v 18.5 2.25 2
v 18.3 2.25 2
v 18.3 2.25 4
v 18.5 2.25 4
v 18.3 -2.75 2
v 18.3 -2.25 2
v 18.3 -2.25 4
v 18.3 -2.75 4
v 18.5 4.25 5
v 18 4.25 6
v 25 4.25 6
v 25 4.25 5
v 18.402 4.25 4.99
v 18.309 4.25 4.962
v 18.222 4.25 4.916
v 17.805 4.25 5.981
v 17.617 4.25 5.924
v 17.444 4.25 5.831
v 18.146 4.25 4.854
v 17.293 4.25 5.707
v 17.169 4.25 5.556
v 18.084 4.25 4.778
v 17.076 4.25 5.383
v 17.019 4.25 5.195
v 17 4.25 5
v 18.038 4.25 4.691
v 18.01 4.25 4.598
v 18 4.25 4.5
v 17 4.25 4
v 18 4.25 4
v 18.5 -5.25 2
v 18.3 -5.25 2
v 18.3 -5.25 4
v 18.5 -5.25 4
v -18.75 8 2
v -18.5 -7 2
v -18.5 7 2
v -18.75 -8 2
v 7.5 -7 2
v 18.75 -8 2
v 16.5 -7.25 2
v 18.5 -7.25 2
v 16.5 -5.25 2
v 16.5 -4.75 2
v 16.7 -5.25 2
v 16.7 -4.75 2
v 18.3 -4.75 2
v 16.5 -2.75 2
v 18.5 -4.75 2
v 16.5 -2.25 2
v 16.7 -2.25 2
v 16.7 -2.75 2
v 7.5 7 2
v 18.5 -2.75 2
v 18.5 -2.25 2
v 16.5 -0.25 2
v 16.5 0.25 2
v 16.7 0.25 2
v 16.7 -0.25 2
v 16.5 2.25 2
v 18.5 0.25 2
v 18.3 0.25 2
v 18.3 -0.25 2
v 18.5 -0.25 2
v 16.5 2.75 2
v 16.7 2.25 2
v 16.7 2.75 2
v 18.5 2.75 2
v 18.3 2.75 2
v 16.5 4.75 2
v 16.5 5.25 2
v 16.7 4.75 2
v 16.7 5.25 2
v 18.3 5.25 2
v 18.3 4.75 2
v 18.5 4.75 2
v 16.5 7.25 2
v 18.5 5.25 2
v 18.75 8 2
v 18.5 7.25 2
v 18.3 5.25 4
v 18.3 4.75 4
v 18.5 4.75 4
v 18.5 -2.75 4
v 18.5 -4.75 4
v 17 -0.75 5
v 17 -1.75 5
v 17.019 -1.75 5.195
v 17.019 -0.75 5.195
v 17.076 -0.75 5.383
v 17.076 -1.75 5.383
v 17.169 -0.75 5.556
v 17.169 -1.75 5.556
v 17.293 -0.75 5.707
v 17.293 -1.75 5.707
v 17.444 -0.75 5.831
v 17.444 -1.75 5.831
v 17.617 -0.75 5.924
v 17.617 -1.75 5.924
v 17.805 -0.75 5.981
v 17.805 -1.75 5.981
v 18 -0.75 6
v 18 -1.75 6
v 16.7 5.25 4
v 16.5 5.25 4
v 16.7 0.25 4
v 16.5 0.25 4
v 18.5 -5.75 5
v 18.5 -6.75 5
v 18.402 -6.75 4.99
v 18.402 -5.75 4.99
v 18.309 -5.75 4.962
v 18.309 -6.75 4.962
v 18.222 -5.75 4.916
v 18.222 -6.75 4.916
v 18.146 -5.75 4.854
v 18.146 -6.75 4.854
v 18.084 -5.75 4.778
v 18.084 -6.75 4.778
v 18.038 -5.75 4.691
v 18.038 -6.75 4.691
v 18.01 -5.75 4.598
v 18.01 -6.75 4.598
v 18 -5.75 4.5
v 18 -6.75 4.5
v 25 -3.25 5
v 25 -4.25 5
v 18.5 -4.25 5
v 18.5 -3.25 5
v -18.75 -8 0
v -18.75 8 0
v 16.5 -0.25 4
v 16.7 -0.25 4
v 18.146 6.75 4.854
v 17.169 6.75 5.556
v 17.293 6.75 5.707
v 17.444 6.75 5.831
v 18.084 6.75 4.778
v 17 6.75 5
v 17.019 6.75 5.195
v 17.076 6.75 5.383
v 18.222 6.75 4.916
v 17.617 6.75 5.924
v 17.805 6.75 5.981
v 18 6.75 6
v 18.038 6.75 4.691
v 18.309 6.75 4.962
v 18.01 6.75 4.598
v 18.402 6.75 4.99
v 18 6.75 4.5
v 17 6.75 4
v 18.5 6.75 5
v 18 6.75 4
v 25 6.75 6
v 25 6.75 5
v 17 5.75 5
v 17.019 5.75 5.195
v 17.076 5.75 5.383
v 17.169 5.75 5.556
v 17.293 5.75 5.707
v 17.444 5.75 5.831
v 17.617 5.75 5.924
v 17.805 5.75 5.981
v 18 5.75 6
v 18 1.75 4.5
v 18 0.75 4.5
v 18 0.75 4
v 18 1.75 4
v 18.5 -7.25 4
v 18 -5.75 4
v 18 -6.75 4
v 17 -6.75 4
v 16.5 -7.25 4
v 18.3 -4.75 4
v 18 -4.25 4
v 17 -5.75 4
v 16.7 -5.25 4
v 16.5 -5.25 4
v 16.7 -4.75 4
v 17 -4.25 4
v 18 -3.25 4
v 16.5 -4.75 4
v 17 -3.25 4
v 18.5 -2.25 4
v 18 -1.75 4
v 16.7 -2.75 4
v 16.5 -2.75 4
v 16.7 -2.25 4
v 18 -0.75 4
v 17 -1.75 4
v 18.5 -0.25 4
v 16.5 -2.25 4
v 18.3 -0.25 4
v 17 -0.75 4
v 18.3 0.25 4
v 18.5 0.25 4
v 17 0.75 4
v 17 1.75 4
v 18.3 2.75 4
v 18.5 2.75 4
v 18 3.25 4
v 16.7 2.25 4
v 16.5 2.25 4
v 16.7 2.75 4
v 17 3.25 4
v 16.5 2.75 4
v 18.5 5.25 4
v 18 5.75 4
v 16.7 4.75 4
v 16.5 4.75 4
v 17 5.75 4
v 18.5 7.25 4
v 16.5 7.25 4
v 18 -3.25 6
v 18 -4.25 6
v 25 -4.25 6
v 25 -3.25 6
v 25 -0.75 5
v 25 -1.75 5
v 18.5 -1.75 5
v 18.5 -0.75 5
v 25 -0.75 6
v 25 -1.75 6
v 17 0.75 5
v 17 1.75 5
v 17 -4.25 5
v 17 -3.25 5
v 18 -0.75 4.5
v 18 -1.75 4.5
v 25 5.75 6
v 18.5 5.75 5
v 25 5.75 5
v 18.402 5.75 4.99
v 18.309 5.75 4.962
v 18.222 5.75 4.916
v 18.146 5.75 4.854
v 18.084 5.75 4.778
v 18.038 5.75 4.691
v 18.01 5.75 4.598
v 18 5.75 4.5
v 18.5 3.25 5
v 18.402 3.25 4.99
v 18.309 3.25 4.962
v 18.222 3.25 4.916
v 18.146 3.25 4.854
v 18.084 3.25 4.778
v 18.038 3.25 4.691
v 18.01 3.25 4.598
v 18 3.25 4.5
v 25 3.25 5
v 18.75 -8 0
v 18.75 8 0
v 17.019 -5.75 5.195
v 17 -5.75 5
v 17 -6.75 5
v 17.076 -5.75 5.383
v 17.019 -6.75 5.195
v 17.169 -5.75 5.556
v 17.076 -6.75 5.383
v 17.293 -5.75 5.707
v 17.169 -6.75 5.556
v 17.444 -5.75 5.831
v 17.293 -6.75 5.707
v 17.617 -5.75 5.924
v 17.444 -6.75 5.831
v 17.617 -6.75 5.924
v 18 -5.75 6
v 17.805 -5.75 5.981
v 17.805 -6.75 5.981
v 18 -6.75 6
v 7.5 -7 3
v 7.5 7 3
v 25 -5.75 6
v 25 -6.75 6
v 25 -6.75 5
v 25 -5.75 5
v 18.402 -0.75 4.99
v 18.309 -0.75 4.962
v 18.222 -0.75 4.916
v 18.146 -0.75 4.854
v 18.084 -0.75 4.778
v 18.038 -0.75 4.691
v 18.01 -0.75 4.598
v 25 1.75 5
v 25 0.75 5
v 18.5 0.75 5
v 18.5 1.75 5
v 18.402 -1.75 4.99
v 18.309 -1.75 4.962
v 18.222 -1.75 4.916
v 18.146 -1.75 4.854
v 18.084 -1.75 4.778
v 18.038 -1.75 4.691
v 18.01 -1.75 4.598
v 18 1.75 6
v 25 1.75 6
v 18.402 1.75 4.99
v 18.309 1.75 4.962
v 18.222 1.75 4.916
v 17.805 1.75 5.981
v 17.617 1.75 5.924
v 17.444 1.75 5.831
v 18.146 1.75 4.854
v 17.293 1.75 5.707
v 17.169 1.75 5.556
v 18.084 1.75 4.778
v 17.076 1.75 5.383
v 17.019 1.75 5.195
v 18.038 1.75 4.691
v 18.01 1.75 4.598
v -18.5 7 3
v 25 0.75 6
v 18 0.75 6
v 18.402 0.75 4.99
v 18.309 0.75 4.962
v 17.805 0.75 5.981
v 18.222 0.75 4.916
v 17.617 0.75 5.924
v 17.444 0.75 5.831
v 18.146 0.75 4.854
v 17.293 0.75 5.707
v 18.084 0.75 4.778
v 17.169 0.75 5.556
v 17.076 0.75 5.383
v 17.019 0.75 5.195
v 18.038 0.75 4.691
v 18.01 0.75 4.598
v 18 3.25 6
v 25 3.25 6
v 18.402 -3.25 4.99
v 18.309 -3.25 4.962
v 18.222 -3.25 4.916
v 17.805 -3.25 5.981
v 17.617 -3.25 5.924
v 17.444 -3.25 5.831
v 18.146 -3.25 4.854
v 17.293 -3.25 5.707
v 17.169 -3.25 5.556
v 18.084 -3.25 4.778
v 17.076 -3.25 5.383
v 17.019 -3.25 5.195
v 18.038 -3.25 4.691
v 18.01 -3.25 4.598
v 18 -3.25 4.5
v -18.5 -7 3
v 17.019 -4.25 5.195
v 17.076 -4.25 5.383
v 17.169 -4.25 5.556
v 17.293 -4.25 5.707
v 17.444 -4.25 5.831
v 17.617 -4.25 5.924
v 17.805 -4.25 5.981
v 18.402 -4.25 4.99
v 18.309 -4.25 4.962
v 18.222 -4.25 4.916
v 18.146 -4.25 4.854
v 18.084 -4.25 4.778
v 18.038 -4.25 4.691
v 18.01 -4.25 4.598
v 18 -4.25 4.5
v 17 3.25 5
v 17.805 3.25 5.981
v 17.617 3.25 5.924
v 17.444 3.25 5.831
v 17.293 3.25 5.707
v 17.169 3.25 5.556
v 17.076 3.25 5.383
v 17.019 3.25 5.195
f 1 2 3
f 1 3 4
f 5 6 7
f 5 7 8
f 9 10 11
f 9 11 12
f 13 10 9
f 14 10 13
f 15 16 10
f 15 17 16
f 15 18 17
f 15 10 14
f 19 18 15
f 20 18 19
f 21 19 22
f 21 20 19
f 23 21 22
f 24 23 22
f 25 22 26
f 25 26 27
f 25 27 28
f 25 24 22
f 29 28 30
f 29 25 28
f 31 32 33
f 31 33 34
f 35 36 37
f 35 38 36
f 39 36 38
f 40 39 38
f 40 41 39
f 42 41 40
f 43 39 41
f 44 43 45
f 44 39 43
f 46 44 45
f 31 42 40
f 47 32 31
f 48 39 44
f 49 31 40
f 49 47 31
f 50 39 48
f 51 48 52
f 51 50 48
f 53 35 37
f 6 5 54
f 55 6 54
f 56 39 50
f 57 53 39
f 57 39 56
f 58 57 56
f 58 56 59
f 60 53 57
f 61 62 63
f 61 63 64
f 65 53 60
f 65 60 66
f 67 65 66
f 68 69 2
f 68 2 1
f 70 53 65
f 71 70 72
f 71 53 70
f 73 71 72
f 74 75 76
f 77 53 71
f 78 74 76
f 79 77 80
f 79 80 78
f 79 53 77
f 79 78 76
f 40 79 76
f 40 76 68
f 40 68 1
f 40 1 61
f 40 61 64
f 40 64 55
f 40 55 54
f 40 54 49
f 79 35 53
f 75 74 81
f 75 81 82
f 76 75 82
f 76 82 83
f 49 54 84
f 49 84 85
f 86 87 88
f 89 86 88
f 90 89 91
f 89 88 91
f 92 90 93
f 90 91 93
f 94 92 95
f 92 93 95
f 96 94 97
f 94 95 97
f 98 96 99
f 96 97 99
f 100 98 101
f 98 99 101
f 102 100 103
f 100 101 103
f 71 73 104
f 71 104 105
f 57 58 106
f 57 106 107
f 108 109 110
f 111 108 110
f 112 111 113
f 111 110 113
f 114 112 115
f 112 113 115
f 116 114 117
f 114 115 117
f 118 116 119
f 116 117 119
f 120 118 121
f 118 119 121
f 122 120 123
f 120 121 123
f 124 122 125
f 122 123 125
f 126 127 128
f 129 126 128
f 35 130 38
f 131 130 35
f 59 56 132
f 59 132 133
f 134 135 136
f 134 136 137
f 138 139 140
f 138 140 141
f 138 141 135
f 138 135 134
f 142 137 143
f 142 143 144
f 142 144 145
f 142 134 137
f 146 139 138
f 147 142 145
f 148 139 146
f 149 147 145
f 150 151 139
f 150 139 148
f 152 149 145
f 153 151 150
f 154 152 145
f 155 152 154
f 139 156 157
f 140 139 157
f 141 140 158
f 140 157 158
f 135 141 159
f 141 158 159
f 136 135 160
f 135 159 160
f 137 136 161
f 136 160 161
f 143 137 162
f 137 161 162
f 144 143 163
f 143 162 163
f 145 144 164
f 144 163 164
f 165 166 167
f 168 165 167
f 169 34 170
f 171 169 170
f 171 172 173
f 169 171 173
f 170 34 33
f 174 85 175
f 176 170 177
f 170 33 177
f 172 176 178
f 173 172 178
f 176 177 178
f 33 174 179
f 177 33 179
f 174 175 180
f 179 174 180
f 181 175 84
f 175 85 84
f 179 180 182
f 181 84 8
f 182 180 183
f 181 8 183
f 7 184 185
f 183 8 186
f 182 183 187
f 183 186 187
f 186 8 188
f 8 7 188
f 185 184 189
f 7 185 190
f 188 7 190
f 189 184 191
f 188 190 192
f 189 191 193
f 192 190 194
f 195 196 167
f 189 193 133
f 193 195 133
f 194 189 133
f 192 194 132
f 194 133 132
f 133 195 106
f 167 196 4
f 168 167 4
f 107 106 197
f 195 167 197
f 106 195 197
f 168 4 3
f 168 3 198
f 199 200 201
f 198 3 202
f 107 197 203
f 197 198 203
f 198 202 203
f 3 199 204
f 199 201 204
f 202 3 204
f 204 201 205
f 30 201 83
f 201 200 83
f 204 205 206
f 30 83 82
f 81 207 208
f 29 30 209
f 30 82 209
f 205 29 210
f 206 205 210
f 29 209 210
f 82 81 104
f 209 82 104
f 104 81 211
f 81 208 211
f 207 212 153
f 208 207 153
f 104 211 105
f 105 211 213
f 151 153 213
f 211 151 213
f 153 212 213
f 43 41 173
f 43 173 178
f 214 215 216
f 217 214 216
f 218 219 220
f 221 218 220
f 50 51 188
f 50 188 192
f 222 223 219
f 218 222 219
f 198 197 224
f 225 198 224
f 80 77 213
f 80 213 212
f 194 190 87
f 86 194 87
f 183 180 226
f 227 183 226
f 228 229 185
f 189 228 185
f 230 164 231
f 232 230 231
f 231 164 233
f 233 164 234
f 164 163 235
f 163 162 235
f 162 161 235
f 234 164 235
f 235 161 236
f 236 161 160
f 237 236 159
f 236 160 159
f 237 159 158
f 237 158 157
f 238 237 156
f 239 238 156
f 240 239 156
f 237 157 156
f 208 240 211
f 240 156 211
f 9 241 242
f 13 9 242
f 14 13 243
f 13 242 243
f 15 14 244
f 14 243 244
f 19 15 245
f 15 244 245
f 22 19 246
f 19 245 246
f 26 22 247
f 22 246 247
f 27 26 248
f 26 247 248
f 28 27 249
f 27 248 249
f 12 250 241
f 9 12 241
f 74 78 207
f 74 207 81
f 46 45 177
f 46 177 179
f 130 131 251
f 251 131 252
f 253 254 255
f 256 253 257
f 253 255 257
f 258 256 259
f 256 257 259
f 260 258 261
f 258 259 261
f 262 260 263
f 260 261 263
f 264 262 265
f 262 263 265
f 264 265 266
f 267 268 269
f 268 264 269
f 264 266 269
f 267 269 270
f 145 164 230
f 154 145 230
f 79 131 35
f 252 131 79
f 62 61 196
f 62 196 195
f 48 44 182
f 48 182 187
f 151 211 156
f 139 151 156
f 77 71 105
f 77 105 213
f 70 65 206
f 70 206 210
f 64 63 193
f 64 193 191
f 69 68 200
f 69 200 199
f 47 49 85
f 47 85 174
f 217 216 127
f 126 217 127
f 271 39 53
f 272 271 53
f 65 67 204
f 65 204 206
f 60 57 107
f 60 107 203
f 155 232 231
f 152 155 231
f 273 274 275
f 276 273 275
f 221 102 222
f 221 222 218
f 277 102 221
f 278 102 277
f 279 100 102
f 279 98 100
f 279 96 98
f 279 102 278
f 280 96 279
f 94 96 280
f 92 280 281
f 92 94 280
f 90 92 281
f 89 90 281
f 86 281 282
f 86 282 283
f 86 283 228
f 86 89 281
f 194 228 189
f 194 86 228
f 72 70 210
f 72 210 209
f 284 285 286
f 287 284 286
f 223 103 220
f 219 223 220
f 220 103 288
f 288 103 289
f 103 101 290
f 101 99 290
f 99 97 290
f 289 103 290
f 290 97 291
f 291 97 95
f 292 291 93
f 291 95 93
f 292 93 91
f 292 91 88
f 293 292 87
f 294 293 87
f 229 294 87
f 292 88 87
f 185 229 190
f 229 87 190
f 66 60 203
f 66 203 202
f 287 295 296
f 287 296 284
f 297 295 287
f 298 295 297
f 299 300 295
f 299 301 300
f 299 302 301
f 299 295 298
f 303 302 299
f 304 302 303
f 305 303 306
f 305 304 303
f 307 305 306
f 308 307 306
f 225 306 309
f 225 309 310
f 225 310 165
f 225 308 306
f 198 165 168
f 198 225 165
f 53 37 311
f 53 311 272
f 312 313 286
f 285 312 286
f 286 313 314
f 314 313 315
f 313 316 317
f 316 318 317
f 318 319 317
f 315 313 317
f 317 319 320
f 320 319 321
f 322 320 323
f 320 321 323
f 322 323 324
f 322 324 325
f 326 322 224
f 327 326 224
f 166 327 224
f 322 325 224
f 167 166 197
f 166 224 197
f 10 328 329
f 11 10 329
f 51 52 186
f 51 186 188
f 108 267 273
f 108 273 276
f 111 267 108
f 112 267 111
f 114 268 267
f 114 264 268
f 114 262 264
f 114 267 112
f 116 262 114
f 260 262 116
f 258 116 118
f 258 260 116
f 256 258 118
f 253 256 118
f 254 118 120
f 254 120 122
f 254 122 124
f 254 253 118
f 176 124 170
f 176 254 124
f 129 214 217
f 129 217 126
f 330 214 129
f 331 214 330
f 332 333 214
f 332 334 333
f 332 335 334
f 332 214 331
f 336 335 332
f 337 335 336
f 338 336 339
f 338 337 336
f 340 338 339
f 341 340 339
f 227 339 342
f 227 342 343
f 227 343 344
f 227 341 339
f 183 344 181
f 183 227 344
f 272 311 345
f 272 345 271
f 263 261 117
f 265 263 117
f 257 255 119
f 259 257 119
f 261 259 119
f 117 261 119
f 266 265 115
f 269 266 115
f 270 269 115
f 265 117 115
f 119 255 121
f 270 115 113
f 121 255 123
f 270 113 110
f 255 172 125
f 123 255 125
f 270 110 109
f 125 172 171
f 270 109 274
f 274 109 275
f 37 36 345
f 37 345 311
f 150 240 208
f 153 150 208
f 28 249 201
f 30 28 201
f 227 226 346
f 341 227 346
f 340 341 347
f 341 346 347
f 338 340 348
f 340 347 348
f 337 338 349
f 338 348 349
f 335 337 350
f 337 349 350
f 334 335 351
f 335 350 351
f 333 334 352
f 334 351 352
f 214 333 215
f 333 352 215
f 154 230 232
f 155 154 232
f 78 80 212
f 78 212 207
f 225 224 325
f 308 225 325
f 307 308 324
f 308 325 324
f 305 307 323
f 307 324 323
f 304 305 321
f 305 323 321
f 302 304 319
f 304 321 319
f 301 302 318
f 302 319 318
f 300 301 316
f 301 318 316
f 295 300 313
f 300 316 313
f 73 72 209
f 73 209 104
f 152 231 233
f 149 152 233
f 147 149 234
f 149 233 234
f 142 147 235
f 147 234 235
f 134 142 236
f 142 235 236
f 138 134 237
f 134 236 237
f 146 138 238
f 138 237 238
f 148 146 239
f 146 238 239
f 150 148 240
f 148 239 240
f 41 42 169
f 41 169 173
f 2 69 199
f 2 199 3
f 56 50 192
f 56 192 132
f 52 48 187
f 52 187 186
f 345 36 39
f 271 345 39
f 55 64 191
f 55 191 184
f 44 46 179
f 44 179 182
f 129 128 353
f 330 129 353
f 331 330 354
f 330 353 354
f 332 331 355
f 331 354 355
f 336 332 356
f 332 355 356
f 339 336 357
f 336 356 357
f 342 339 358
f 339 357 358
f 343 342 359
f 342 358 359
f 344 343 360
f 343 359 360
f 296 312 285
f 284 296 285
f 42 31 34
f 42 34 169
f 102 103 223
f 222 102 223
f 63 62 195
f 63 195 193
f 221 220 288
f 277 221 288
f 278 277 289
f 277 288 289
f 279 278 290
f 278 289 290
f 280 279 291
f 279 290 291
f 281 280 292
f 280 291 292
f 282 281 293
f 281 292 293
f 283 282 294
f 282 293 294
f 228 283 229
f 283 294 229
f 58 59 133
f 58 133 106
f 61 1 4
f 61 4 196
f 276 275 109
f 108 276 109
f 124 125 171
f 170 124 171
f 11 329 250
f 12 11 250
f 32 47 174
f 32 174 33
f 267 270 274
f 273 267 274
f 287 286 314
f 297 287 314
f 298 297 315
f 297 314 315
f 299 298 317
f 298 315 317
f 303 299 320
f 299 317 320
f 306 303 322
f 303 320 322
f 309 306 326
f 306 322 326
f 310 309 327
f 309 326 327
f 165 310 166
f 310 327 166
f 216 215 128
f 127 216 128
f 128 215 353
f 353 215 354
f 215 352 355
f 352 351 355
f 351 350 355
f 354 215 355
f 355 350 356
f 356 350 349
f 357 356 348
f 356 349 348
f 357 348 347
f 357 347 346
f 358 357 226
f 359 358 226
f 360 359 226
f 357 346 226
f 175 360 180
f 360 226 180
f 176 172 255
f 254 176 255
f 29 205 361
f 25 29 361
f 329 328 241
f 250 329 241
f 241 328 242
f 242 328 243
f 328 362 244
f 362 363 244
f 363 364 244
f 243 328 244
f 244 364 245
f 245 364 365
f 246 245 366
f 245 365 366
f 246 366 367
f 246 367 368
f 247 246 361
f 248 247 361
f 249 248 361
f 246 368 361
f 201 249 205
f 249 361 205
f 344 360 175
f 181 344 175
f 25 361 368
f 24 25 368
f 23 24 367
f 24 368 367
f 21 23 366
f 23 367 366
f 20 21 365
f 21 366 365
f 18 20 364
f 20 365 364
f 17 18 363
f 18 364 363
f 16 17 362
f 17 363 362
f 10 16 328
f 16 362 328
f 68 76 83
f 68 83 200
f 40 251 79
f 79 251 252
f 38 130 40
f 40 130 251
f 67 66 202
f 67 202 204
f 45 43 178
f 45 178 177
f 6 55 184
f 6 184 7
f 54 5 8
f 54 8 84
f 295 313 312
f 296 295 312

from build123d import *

# Parameters (mm, degrees)
SKETCH1_W                = 37.5
SKETCH1_H                = 16
BOSS_EXTRUDE1_DEPTH      = 2
SKETCH2_W                = 26
SKETCH2_H                = 14
BOSS_EXTRUDE2_DEPTH      = 1
BOSS_EXTRUDE3_DEPTH      = 2
BOSS_EXTRUDE4_DEPTH      = 6.75
BOSS_EXTRUDE4_DEPTH_BACK = 6.75
CUT_EXTRUDE1_DEPTH       = 27.925824036
CUT_EXTRUDE1_DEPTH_BACK  = 27.925824036
SKETCH5_W                = 2
SKETCH5_H                = 1.5


with BuildPart() as part:
    # Sketch1 → Boss-Extrude1 (new body)
    with BuildSketch(Plane.XY):
        Rectangle(SKETCH1_W, SKETCH1_H)
    extrude(amount=BOSS_EXTRUDE1_DEPTH)

    # Sketch2 → Boss-Extrude2 (add)
    with BuildSketch(Plane.XY.offset(2)):
        with Locations((-5.5, 0)):
            Rectangle(SKETCH2_W, SKETCH2_H)
    extrude(amount=BOSS_EXTRUDE2_DEPTH)

    # Sketch3 → Boss-Extrude3 (add)
    with BuildSketch(Plane.XY.offset(2)):
        Polygon((18.3, -5.25), (18.5, -5.25), (18.5, -7.25), (16.5, -7.25), (16.5, -5.25), (16.7, -5.25), (16.7, -4.75), (16.5, -4.75), (16.5, -2.75), (16.7, -2.75), (16.7, -2.25), (16.5, -2.25), (16.5, -0.25), (16.7, -0.25), (16.7, 0.25), (16.5, 0.25), (16.5, 2.25), (16.7, 2.25), (16.7, 2.75), (16.5, 2.75), (16.5, 4.75), (16.7, 4.75), (16.7, 5.25), (16.5, 5.25), (16.5, 7.25), (18.5, 7.25), (18.5, 5.25), (18.3, 5.25), (18.3, 4.75), (18.5, 4.75), (18.5, 2.75), (18.3, 2.75), (18.3, 2.25), (18.5, 2.25), (18.5, 0.25), (18.3, 0.25), (18.3, -0.25), (18.5, -0.25), (18.5, -2.25), (18.3, -2.25), (18.3, -2.75), (18.5, -2.75), (18.5, -4.75), (18.3, -4.75), align=None)
    extrude(amount=BOSS_EXTRUDE3_DEPTH)

    # Sketch4 → Boss-Extrude4 (add, two sides: drawn at the far end of the back side and taken through both)
    with BuildSketch(Plane(origin=(0, 0, 0), x_dir=(1, 0, 0), z_dir=(0, 1, 0)).offset(-BOSS_EXTRUDE4_DEPTH_BACK)):
        with BuildLine():
            Line((17, -4), (17, -5))
            ThreePointArc((17, -5), (17.292893219, -5.707106781), (18, -6))
            Line((18, -6), (25, -6))
            Line((25, -6), (25, -5))
            Line((25, -5), (18.5, -5))
            ThreePointArc((18.5, -5), (18.146446609, -4.853553391), (18, -4.5))
            Line((18, -4.5), (18, -4))
            Line((18, -4), (17, -4))
        make_face()
    extrude(amount=BOSS_EXTRUDE4_DEPTH + BOSS_EXTRUDE4_DEPTH_BACK)

    # Sketch5 → Cut-Extrude1 (cut, two sides: drawn at the far end of the back side and taken through both)
    with BuildSketch(Plane(origin=(0, 0, 0), x_dir=(0, 0, -1), z_dir=(1, 0, 0)).offset(-CUT_EXTRUDE1_DEPTH_BACK)):
        with Locations((-5, -5)):
            Rectangle(SKETCH5_W, SKETCH5_H)
        with Locations((-5, -2.5)):
            Rectangle(SKETCH5_W, SKETCH5_H)
        with Locations((-5, 0)):
            Rectangle(SKETCH5_W, SKETCH5_H)
        with Locations((-5, 2.5)):
            Rectangle(SKETCH5_W, SKETCH5_H)
        with Locations((-5, 5)):
            Rectangle(SKETCH5_W, SKETCH5_H)
    extrude(amount=CUT_EXTRUDE1_DEPTH + CUT_EXTRUDE1_DEPTH_BACK, mode=Mode.SUBTRACT)


solid = part.part
